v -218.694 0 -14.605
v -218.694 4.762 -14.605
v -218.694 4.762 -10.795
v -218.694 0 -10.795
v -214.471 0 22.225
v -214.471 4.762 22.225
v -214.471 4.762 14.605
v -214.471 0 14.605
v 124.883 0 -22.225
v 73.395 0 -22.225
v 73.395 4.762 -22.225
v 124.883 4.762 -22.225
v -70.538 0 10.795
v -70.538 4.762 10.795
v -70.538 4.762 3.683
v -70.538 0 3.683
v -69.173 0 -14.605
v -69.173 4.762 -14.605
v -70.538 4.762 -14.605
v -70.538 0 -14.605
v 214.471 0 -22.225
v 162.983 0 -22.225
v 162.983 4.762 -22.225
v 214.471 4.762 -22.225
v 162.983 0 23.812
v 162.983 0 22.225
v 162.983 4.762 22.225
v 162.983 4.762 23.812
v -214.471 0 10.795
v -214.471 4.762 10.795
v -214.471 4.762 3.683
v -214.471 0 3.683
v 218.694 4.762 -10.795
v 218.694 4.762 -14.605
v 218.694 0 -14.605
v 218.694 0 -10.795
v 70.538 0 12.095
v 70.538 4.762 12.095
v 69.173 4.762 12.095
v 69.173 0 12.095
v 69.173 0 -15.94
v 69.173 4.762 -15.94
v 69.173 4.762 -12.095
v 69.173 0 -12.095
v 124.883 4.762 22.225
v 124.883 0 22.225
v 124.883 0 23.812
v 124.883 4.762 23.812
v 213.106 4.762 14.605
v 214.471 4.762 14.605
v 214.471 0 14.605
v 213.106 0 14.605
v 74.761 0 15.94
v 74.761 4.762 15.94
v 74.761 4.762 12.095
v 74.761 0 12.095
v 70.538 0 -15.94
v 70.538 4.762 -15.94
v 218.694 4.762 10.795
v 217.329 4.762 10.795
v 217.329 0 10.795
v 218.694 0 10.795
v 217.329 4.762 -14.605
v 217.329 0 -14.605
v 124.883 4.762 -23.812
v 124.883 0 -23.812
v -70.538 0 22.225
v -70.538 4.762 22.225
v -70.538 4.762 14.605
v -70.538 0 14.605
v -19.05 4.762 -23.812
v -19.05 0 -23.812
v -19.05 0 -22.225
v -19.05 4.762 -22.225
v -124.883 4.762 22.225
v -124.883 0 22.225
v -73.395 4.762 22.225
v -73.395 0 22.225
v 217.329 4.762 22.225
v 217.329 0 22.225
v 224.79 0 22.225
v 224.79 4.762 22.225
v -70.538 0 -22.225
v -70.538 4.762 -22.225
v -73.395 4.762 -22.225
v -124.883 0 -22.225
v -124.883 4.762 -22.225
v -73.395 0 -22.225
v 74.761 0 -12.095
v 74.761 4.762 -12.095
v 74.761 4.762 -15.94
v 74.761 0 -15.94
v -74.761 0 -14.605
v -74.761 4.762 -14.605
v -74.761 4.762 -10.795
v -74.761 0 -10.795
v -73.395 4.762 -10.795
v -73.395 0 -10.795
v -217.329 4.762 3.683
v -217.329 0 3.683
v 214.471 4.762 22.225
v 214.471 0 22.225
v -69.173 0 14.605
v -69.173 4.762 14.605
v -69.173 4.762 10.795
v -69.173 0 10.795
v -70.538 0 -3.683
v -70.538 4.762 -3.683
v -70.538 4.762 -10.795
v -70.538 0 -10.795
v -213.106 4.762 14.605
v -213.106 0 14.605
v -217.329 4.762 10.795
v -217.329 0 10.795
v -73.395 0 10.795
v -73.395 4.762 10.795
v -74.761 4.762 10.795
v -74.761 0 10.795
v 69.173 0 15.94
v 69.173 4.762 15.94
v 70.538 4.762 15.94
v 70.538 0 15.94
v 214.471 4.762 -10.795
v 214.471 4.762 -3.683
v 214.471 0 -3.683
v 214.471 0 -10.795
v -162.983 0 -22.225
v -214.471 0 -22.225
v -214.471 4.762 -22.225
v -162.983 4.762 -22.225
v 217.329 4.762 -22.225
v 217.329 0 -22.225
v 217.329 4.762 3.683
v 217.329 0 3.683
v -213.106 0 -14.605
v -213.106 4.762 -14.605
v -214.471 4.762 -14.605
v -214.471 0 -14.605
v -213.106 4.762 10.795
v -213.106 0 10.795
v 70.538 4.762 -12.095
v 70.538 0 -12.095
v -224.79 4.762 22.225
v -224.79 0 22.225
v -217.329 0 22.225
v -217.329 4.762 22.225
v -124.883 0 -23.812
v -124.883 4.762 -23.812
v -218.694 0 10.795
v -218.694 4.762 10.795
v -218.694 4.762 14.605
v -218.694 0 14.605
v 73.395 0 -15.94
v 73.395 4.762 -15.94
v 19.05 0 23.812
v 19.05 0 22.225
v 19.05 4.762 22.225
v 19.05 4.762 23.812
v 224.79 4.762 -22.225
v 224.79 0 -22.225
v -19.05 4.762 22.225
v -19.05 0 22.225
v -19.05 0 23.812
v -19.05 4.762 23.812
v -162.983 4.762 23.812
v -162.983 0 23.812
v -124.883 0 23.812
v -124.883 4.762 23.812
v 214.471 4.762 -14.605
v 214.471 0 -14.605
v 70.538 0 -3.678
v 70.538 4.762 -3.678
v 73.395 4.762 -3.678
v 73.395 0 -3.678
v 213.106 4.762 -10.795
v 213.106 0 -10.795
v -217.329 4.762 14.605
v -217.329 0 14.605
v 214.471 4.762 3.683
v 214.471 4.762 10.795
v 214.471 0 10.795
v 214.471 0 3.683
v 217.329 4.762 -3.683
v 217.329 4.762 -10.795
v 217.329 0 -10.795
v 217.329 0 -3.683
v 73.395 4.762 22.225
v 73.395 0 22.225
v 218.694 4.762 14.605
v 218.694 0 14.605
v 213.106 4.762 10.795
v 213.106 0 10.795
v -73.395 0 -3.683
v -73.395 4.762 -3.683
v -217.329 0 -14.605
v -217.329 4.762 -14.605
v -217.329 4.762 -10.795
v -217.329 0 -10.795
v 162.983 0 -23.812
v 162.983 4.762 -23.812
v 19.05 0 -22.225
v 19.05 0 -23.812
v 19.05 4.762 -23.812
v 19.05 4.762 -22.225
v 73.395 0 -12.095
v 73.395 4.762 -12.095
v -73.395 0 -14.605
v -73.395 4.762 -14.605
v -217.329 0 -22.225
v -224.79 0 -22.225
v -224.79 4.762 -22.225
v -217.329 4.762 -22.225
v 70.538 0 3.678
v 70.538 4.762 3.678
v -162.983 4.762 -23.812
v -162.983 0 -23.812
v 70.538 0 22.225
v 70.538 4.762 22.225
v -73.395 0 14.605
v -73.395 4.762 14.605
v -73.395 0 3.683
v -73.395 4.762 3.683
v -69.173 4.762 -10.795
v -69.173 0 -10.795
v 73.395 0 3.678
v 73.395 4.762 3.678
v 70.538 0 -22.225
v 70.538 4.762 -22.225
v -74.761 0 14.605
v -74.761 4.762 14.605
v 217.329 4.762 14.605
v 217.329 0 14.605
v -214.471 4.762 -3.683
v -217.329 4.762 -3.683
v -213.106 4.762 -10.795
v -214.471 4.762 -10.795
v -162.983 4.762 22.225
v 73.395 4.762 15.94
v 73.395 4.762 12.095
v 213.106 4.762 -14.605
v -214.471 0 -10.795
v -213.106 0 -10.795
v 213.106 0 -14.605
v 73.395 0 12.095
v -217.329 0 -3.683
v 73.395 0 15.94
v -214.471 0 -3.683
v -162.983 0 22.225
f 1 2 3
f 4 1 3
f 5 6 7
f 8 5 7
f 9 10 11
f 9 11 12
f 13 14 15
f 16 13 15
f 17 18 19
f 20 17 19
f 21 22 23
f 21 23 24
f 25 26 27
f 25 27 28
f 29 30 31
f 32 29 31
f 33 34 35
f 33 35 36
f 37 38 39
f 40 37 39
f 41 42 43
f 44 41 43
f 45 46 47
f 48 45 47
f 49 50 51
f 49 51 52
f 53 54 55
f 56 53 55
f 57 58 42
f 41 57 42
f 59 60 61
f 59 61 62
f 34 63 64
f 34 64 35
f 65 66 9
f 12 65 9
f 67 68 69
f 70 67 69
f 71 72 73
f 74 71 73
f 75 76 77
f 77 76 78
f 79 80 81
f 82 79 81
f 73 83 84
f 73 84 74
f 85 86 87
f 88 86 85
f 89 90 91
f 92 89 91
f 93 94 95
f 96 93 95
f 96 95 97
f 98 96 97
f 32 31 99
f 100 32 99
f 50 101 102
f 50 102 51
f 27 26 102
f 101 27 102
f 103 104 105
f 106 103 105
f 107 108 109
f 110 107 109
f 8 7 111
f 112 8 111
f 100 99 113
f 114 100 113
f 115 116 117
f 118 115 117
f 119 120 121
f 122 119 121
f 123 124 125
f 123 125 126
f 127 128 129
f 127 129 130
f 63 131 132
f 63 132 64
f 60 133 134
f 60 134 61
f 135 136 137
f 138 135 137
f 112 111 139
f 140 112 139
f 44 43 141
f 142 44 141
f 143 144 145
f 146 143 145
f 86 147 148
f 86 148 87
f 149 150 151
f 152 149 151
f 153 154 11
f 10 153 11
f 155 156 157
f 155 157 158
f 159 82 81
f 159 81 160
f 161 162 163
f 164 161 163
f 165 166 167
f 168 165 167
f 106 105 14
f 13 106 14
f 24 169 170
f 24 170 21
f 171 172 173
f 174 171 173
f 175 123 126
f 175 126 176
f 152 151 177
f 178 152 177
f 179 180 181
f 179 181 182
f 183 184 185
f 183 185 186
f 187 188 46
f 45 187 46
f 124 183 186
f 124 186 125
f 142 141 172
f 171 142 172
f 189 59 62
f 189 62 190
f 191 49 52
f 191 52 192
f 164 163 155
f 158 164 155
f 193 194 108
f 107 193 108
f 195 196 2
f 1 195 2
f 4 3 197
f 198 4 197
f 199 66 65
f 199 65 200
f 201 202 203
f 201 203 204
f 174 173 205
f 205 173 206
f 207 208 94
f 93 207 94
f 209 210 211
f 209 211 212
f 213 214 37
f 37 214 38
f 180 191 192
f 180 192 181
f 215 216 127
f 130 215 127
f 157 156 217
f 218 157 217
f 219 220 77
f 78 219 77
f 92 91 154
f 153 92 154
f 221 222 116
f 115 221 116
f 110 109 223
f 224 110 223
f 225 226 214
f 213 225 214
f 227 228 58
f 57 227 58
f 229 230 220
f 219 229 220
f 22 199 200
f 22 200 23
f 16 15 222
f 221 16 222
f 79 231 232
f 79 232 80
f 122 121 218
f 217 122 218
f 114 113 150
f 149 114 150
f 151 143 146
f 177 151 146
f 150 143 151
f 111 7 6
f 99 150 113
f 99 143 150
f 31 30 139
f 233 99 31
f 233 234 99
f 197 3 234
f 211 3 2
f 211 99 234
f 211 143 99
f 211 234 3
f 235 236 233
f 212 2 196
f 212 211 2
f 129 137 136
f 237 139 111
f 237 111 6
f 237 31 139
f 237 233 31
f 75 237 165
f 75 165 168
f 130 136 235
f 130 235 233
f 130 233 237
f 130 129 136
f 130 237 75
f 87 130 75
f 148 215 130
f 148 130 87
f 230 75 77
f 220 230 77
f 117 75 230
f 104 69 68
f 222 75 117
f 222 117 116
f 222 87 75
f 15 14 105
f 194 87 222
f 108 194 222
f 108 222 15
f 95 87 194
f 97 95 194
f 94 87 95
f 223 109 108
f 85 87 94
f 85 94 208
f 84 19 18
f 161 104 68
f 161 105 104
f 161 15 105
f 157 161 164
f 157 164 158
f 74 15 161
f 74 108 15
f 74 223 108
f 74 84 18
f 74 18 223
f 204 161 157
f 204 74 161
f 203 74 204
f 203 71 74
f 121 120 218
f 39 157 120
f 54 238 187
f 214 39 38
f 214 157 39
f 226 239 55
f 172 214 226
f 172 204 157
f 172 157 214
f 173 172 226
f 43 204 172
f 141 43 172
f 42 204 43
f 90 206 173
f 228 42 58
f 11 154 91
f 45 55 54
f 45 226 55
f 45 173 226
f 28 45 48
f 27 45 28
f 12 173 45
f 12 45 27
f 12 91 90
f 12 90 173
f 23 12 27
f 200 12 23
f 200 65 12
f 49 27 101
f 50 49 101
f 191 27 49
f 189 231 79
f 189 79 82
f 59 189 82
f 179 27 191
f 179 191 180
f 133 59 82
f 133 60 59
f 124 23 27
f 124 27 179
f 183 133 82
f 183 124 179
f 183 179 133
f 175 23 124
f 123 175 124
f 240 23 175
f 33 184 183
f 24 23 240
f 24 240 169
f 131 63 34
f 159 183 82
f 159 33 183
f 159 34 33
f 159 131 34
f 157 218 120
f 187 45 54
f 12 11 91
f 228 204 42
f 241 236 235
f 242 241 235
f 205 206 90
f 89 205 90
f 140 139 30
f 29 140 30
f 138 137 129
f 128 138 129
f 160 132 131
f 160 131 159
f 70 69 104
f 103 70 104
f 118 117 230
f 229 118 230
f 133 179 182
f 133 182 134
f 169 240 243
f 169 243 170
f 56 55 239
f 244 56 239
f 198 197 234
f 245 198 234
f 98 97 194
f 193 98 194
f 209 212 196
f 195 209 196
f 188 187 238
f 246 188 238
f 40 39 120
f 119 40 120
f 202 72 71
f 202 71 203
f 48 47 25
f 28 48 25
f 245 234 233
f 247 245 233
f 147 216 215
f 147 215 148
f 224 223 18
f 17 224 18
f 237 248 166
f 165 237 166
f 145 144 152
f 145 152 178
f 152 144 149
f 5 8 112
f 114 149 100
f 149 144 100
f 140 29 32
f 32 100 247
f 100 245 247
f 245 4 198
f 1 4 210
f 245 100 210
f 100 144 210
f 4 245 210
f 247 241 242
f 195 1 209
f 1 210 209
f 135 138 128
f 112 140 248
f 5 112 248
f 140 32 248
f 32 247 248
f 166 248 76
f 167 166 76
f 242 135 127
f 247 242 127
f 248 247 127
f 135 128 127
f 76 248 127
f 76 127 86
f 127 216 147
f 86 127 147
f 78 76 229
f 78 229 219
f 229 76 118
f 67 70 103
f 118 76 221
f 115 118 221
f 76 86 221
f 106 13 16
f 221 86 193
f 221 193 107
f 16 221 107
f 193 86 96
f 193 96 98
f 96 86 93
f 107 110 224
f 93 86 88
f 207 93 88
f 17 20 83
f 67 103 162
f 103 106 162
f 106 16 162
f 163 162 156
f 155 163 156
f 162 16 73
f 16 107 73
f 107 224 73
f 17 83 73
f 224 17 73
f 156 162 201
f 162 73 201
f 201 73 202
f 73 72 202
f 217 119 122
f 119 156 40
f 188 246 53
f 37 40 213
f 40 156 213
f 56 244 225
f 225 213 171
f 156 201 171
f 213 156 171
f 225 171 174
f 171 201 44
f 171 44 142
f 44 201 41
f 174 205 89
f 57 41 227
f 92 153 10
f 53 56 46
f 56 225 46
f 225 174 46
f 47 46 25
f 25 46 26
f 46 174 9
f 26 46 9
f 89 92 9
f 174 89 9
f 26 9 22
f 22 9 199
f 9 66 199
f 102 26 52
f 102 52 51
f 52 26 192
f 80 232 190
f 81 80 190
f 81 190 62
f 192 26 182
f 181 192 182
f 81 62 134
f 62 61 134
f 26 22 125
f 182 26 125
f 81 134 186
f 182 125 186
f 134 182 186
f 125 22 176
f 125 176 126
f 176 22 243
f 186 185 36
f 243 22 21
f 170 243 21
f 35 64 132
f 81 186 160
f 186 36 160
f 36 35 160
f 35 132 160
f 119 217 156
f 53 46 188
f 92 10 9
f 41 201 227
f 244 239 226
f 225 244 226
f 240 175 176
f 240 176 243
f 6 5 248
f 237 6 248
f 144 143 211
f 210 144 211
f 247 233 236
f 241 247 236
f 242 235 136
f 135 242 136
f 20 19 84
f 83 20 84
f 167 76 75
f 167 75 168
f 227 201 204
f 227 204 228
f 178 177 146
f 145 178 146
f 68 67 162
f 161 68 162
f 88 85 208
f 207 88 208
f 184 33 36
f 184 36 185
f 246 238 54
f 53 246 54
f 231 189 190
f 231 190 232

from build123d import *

# Parameters (mm, degrees)
SKETCH1_W           = 457.2
SKETCH1_H           = 47.625
BOSS_EXTRUDE1_DEPTH = 4.7625
SKETCH2_W           = 65.616666667
SKETCH2_H           = 1.5875
SKETCH2_W_2         = 105.833333333
CUT_EXTRUDE1_DEPTH  = 4.7625
SKETCH3_W           = 65.616666667
SKETCH3_H           = 1.5875
SKETCH3_W_2         = 105.833333333
CUT_EXTRUDE3_DEPTH  = 4.7625
CUT_EXTRUDE4_DEPTH  = 4.7625
SKETCH6_W           = 3.81
SKETCH6_H           = 44.45
CUT_EXTRUDE6_DEPTH  = 4.7625


with BuildPart() as part:
    # Sketch1 → Boss-Extrude1 (new body)
    with BuildSketch(Plane(origin=(0, 0, 0), x_dir=(1, 0, 0), z_dir=(0, 1, 0))):
        Rectangle(SKETCH1_W, SKETCH1_H)
    extrude(amount=BOSS_EXTRUDE1_DEPTH)

    # Sketch2 → Cut-Extrude1 (cut)
    with BuildSketch(Plane.XZ):
        with Locations((-195.791666667, 23.01875)):
            Rectangle(SKETCH2_W, SKETCH2_H)
        with Locations((-71.966666667, 23.01875)):
            Rectangle(SKETCH2_W_2, SKETCH2_H)
        with Locations((71.966666667, 23.01875)):
            Rectangle(SKETCH2_W_2, SKETCH2_H)
        with Locations((195.791666667, 23.01875)):
            Rectangle(SKETCH2_W, SKETCH2_H)
    extrude(amount=-CUT_EXTRUDE1_DEPTH, mode=Mode.SUBTRACT)

    # Sketch3 → Cut-Extrude3 (cut)
    with BuildSketch(Plane.XZ):
        with Locations((-195.791666667, -23.01875)):
            Rectangle(SKETCH3_W, SKETCH3_H)
        with Locations((-71.966666667, -23.01875)):
            Rectangle(SKETCH3_W_2, SKETCH3_H)
        with Locations((71.966666667, -23.01875)):
            Rectangle(SKETCH3_W_2, SKETCH3_H)
        with Locations((195.791666667, -23.01875)):
            Rectangle(SKETCH3_W, SKETCH3_H)
    extrude(amount=-CUT_EXTRUDE3_DEPTH, mode=Mode.SUBTRACT)

    # Sketch4 → Cut-Extrude4 (cut)
    with BuildSketch(Plane(origin=(0, 4.7625, 0), x_dir=(1, 0, 0), z_dir=(0, 1, 0))):
        Polygon((217.32875, -22.225), (214.47125, -22.225), (214.47125, -14.605), (213.106, -14.605), (213.106, -10.795), (214.47125, -10.795), (214.47125, -3.683), (217.32875, -3.683), (217.32875, -10.795), (218.694, -10.795), (218.694, -14.605), (217.32875, -14.605), align=None)
        Polygon((73.395413242, -22.225), (73.395413242, -15.940182767), (74.760663242, -15.940182767), (74.760663242, -12.094601121), (73.395413242, -12.094601121), (73.395413242, -3.677534747), (70.537920091, -3.677534747), (70.537920091, -12.094601121), (69.172670091, -12.094601121), (69.172670091, -15.940182767), (70.537920091, -15.940182767), (70.537920091, -22.225), align=None)
        Polygon((-70.537916667, -22.225), (-70.537916667, -14.605), (-69.172666667, -14.605), (-69.172666667, -10.795), (-70.537916667, -10.795), (-70.537916667, -3.683), (-73.395416667, -3.683), (-73.395416667, -10.795), (-74.760666667, -10.795), (-74.760666667, -14.605), (-73.395416667, -14.605), (-73.395416667, -22.225), align=None)
        Polygon((-214.47125, -22.225), (-214.47125, -14.605), (-213.106, -14.605), (-213.106, -10.795), (-214.47125, -10.795), (-214.47125, -3.683), (-217.32875, -3.683), (-217.32875, -10.795), (-218.694, -10.795), (-218.694, -14.605), (-217.32875, -14.605), (-217.32875, -22.225), align=None)
        Polygon((-214.47125, 22.225), (-217.32875, 22.225), (-217.32875, 14.605), (-218.694, 14.605), (-218.694, 10.795), (-217.32875, 10.795), (-217.32875, 3.683), (-214.47125, 3.683), (-214.47125, 10.795), (-213.106, 10.795), (-213.106, 14.605), (-214.47125, 14.605), align=None)
        Polygon((-69.172666667, 14.605), (-70.537916667, 14.605), (-70.537916667, 22.225), (-73.395416667, 22.225), (-73.395416667, 14.605), (-74.760666667, 14.605), (-74.760666667, 10.795), (-73.395416667, 10.795), (-73.395416667, 3.683), (-70.537916667, 3.683), (-70.537916667, 10.795), (-69.172666667, 10.795), align=None)
        Polygon((74.760663242, 15.940182767), (73.395413242, 15.940182767), (73.395413242, 22.225), (70.537920091, 22.225), (70.537920091, 15.940182767), (69.172670091, 15.940182767), (69.172670091, 12.094601121), (70.537920091, 12.094601121), (70.537920091, 3.677534747), (73.395413242, 3.677534747), (73.395413242, 12.094601121), (74.760663242, 12.094601121), align=None)
        Polygon((218.694, 10.795), (217.32875, 10.795), (217.32875, 3.683), (214.47125, 3.683), (214.47125, 10.795), (213.106, 10.795), (213.106, 14.605), (214.47125, 14.605), (214.47125, 22.225), (217.32875, 22.225), (217.32875, 14.605), (218.694, 14.605), align=None)
    extrude(amount=-CUT_EXTRUDE4_DEPTH, mode=Mode.SUBTRACT)

    # Sketch6 → Cut-Extrude6 (cut)
    with BuildSketch(Plane(origin=(0, 4.7625, 0), x_dir=(1, 0, 0), z_dir=(0, 1, 0))):
        with Locations((-226.695, 0)):
            Rectangle(SKETCH6_W, SKETCH6_H)
        with Locations((226.695, 0)):
            Rectangle(SKETCH6_W, SKETCH6_H)
    extrude(amount=-CUT_EXTRUDE6_DEPTH, mode=Mode.SUBTRACT)


solid = part.part
